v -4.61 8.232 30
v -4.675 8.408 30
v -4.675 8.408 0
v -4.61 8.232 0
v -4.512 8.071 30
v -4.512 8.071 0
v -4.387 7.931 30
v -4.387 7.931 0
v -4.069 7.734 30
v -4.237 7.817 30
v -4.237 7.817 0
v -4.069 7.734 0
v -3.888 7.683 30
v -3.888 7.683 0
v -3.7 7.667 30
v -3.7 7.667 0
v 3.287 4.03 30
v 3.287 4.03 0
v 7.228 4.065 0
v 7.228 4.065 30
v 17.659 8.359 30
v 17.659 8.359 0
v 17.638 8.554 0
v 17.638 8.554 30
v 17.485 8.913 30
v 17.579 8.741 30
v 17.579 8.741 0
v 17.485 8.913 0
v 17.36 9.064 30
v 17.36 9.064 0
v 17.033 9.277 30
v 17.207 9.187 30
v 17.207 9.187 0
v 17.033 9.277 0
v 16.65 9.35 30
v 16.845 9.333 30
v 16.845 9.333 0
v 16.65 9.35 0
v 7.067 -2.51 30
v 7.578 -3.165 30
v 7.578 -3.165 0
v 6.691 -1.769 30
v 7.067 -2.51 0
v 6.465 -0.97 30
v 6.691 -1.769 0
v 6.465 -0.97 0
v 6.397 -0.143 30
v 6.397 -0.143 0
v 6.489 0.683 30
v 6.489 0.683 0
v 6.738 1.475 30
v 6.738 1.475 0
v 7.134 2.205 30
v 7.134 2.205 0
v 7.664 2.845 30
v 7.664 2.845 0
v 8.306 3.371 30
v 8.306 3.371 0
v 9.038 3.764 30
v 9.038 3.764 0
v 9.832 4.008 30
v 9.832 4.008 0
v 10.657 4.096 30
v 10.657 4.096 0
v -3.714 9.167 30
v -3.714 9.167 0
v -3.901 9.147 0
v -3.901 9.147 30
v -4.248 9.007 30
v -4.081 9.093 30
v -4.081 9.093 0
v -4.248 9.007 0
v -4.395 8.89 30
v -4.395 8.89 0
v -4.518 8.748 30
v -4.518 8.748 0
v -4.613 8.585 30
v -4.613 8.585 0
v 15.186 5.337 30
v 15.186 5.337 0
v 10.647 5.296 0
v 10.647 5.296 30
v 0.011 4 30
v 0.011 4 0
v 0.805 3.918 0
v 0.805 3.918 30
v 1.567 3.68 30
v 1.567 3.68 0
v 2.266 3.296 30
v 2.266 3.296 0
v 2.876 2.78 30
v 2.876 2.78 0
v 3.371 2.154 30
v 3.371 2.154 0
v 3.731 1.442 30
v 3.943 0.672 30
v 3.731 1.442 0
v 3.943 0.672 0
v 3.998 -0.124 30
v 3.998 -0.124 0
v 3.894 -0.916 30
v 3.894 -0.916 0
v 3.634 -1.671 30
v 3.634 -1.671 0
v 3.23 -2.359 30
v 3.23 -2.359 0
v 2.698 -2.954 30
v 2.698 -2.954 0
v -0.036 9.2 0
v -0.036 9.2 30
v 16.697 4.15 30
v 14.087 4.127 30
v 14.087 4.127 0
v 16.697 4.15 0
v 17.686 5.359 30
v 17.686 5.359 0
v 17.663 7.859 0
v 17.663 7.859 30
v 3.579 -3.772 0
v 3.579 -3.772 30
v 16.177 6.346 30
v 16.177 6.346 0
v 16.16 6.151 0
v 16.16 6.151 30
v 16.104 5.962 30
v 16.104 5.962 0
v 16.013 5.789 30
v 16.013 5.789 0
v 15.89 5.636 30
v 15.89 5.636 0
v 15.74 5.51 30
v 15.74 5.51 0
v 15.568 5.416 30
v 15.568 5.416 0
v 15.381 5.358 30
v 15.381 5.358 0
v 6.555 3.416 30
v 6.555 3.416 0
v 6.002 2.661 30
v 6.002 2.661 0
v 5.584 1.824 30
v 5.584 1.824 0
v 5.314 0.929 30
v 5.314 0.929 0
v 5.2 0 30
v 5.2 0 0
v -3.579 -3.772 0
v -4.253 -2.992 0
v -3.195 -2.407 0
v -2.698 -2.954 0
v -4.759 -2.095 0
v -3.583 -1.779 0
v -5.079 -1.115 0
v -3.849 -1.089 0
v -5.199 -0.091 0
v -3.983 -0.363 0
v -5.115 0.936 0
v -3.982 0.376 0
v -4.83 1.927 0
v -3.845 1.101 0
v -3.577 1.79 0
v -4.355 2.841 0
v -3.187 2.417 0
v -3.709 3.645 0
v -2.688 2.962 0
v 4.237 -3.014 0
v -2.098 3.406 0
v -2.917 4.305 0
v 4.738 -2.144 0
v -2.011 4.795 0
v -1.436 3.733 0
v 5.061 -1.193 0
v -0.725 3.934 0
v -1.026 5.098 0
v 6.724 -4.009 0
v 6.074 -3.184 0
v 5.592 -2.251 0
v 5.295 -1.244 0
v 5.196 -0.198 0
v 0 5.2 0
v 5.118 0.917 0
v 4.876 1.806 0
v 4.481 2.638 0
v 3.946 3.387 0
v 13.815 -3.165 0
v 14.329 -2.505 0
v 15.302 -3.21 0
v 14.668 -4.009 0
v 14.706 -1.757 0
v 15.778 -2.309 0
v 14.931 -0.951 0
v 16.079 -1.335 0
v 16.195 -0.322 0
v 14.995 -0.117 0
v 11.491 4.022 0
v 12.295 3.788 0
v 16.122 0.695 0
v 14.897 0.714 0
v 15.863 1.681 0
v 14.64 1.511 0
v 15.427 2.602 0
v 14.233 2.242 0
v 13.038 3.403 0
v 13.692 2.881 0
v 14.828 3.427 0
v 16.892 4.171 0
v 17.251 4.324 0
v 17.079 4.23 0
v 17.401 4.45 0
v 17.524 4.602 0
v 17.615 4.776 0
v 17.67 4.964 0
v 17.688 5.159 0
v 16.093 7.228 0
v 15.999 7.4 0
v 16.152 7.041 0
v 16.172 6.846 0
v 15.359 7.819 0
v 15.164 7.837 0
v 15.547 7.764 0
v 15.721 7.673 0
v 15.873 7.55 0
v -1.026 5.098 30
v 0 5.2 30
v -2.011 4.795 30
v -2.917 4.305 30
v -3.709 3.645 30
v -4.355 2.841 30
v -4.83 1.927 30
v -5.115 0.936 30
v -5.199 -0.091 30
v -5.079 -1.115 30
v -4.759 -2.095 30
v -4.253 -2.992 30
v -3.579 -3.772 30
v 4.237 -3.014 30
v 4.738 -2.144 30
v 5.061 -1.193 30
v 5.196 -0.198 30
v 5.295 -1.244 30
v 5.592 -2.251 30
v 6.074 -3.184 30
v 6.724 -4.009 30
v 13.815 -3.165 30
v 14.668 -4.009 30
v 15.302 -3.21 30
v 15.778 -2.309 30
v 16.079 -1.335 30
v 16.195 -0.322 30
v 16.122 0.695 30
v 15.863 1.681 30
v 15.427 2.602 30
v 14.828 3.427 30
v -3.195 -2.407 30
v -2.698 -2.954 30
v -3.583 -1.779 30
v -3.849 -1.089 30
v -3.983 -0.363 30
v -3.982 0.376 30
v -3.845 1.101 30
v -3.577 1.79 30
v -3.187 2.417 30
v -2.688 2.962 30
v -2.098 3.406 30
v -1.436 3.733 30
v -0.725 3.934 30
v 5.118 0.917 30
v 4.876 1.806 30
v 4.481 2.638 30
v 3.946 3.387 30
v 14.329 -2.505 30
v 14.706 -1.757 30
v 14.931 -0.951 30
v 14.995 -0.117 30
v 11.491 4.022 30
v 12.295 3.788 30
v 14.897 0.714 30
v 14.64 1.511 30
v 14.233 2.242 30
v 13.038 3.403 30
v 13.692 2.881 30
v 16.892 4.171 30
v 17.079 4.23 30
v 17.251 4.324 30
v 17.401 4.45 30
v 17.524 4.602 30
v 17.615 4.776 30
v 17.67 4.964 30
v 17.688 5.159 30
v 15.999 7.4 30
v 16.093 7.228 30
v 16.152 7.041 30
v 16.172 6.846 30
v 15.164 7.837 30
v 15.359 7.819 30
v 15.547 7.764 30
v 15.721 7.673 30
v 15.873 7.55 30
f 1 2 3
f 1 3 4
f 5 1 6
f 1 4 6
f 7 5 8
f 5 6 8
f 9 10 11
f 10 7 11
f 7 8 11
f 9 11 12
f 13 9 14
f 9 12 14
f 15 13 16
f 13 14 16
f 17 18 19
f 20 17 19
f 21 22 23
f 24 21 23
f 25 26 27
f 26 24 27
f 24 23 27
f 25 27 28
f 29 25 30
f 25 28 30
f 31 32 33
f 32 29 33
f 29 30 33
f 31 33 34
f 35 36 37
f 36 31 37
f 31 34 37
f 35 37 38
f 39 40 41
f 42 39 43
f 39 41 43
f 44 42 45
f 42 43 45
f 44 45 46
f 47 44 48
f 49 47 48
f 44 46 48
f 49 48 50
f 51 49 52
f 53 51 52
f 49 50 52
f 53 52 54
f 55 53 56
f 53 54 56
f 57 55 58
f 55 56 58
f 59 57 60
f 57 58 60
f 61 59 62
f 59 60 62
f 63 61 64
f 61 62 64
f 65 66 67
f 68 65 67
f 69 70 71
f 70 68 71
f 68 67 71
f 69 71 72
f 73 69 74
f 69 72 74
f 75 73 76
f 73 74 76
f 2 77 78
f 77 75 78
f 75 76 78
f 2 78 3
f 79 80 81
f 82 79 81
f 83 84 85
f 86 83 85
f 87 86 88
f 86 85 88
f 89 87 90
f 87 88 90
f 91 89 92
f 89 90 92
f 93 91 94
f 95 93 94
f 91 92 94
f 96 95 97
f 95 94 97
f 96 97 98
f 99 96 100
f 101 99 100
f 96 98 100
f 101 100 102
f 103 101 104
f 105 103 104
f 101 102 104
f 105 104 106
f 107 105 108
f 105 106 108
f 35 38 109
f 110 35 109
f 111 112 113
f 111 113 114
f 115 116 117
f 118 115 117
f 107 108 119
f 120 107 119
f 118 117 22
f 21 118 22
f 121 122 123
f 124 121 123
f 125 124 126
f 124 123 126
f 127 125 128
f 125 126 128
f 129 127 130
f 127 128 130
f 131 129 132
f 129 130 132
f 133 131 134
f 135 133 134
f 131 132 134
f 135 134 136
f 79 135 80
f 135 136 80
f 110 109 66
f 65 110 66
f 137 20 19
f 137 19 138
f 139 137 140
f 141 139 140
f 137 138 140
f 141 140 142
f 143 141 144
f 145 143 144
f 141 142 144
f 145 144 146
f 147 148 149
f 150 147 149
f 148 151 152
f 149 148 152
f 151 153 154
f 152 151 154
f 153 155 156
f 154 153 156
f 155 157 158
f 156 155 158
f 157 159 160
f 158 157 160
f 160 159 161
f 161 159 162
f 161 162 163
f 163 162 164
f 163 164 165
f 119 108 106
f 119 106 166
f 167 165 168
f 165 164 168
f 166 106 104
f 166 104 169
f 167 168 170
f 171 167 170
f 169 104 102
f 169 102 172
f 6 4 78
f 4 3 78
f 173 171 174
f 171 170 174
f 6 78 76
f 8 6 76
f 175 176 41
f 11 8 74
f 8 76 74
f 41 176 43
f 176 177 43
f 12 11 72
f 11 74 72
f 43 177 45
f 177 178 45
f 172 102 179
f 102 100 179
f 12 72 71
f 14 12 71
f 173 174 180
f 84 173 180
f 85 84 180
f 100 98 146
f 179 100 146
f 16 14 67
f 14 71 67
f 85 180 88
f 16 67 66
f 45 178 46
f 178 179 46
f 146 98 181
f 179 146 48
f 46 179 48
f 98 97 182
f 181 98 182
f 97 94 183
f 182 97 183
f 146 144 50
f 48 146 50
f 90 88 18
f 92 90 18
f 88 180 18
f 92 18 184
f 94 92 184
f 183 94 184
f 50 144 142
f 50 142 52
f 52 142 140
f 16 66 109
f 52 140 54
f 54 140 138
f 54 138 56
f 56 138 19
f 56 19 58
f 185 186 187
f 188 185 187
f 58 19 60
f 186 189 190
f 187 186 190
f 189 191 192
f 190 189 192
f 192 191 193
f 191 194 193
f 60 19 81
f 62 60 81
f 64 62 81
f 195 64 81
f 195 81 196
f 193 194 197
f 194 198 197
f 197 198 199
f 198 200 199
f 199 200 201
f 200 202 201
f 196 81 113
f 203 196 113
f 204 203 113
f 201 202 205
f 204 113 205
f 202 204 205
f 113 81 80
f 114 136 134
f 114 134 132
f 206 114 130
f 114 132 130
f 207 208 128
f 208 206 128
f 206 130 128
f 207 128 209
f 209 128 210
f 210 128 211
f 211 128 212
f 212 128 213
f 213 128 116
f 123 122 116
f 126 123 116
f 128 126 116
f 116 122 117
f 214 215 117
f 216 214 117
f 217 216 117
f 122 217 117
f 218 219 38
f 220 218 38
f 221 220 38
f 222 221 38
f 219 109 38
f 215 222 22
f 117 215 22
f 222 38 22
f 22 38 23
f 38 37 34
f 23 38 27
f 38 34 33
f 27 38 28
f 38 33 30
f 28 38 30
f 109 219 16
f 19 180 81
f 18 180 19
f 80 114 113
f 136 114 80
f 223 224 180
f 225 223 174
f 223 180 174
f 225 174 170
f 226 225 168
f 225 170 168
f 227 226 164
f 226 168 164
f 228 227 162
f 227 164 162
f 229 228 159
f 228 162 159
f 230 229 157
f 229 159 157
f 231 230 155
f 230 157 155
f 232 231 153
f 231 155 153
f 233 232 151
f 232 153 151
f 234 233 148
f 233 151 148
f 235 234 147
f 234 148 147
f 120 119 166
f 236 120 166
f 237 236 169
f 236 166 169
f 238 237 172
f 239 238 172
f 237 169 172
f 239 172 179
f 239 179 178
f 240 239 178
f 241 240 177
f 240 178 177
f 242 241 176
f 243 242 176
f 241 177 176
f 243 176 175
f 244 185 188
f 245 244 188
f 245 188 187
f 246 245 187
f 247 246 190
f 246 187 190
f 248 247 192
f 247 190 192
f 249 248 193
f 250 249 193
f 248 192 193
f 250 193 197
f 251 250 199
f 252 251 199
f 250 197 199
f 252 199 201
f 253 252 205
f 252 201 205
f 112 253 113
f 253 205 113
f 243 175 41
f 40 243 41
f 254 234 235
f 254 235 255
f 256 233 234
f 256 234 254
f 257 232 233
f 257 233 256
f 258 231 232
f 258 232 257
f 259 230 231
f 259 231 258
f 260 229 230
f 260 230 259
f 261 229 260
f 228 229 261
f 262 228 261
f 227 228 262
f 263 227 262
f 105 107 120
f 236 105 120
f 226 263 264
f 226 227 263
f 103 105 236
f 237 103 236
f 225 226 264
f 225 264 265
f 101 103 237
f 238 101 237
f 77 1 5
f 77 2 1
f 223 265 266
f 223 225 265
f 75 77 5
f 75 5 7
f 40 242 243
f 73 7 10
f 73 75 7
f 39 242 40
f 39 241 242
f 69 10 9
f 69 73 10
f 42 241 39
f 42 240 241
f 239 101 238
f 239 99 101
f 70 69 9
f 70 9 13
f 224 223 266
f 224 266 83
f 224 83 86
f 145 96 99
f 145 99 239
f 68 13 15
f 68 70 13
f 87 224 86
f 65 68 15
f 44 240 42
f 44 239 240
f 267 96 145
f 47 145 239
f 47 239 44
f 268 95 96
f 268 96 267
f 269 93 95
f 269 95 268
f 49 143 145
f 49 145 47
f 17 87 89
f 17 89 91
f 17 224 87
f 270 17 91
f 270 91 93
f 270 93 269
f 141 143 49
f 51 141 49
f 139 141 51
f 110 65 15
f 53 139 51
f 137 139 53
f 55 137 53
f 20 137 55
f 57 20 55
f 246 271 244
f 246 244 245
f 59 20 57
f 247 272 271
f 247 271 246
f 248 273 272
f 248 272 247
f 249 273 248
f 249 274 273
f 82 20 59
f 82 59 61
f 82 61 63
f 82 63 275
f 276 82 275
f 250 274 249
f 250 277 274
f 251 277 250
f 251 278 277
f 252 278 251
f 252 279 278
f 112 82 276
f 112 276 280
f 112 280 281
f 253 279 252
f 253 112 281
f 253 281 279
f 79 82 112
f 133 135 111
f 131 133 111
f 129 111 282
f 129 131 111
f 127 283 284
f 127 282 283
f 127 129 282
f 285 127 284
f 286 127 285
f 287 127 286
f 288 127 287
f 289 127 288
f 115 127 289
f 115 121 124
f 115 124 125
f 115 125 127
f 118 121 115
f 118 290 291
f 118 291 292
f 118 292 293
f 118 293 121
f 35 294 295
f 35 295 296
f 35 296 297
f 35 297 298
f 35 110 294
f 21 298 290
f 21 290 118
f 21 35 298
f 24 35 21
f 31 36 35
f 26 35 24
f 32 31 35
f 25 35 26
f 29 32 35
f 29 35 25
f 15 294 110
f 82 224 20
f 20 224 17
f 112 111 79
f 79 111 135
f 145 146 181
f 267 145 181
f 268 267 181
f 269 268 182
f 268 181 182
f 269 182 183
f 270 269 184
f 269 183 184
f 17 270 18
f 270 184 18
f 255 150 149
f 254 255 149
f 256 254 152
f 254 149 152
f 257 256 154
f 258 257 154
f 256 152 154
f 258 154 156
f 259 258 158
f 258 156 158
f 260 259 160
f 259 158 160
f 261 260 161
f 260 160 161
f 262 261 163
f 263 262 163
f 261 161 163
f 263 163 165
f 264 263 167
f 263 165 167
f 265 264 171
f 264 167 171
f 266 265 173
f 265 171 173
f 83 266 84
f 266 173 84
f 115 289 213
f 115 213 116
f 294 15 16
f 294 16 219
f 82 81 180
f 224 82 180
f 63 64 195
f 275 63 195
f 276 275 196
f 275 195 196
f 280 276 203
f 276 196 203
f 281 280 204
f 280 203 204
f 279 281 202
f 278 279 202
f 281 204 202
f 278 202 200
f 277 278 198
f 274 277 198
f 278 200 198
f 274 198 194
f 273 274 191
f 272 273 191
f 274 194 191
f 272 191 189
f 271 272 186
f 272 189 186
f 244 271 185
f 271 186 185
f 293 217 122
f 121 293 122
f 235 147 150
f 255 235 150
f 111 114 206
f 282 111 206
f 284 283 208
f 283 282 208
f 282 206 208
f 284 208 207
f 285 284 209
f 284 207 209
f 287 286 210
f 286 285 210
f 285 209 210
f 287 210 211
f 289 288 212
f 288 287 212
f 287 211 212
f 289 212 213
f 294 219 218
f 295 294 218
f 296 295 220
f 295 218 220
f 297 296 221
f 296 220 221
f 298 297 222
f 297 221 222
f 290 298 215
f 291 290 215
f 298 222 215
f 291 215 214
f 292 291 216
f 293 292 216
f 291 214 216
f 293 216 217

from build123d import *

# Parameters (mm, degrees)
F1_DEPTH    = 30
F2_T1_DEPTH = 30
F2_T3_DEPTH = 35


# Not quite as in the source:
# - a fillet or chamfer that OpenCascade refuses, or shapes differently, is made with other operations: its cross-section is extruded or revolved along the edge and cut away or added
# - ends of sketch curves that miss each other by under 0.0002 mm in the source are joined


with BuildPart() as f1:
    # F0 (on Top) → F1 (new body)
    with BuildSketch(Plane.XY):
        with BuildLine():
            ThreePointArc((0.0108101467, 3.9999853926), (3.7311619501, 1.441676282), (2.6975556514, -2.9535052916))
            Line((2.6975556514, -2.9535052916), (3.5790398152, -3.7723300494))
            ThreePointArc((3.5790398152, -3.7723300494), (4.7376169007, -2.1435918693), (5.1962235425, -0.1981436252))
            ThreePointArc((5.1962235425, -0.1981436252), (5.1972192437, -0.0990548017), (5.2, 0))
            ThreePointArc((5.2, 0), (4.6973944029, 2.2303555374), (3.2867362218, 4.0295613915))
            Line((3.2867362218, 4.0295613915), (0.0108101467, 3.9999853926))
        make_face()
        with BuildLine():
            ThreePointArc((-2.6975556514, -2.9535052916), (-3.7272521414, 1.4517546193), (0.0108101467, 3.9999853926))
            Line((0.0108101467, 3.9999853926), (3.2867362218, 4.0295613915))
            ThreePointArc((3.2867362218, 4.0295613915), (1.7444599113, 4.8986589612), (0, 5.2))
            ThreePointArc((0, 5.2), (-4.8299128489, 1.9266400472), (-3.5790398152, -3.7723300494))
            Line((-3.5790398152, -3.7723300494), (-2.6975556514, -2.9535052916))
        make_face()
        with BuildLine():
            ThreePointArc((0, 5.2), (1.7444599113, 4.8986589612), (3.2867362218, 4.0295613915))
            Line((3.2867362218, 4.0295613915), (7.2283371129, 4.065071131))
            ThreePointArc((7.2283371129, 4.065071131), (8.8329374117, 4.9709020374), (10.646673336, 5.2959154939))
            Line((10.646673336, 5.2959154939), (0, 5.2))
        make_face()
        with BuildLine():
            ThreePointArc((5.2, 0), (5.1972192437, -0.0990548017), (5.1962235425, -0.1981436252))
            ThreePointArc((5.1962235425, -0.1981436252), (5.1990557999, -0.099089805), (5.2, 0))
        make_face()
        with BuildLine():
            ThreePointArc((5.2, 0), (5.1990557999, -0.099089805), (5.1962235425, -0.1981436252))
            ThreePointArc((5.1962235425, -0.1981436252), (5.5915030666, -2.2512643656), (6.7244861035, -4.0085065559))
            Line((6.7244861035, -4.0085065559), (7.5779271506, -3.1646460444))
            ThreePointArc((7.5779271506, -3.1646460444), (6.7375812297, 1.4751784497), (10.6574836162, 4.0959641875))
            Line((10.6574836162, 4.0959641875), (7.2283371129, 4.065071131))
            ThreePointArc((7.2283371129, 4.065071131), (5.7748395568, 2.2517463212), (5.2, 0))
        make_face()
        with BuildLine():
            ThreePointArc((10.646673336, 5.2959154939), (8.8329374117, 4.9709020374), (7.2283371129, 4.065071131))
            Line((7.2283371129, 4.065071131), (10.6574836162, 4.0959641875))
            Line((10.6574836162, 4.0959641875), (14.0866300839, 4.1268572436))
            ThreePointArc((14.0866300839, 4.1268572436), (12.4659704087, 5.0036318817), (10.646673336, 5.2959154939))
        make_face()
        with BuildLine():
            Line((16.1859897918, 5.345818995), (10.646673336, 5.2959154939))
            ThreePointArc((10.646673336, 5.2959154939), (12.4659704087, 5.0036318817), (14.0866300839, 4.1268572436))
            Line((14.0866300839, 4.1268572436), (17.6967392423, 4.1593805861))
            Line((17.6967392423, 4.1593805861), (17.6859289245, 5.3593318922))
            Line((17.6859289245, 5.3593318922), (16.1859897918, 5.345818995))
        make_face()
        with BuildLine():
            Line((14.0866300839, 4.1268572436), (10.6574836162, 4.0959641875))
            ThreePointArc((10.6574836162, 4.0959641875), (14.6395734892, 1.510772092), (13.8145139904, -3.1646460444))
            Line((13.8145139904, -3.1646460444), (14.6679550375, -4.0085065559))
            ThreePointArc((14.6679550375, -4.0085065559), (16.1822325131, 0.1881501089), (14.0866300839, 4.1268572436))
        make_face()
        Polygon((16.1634682964, 7.8457175493), (16.1859897918, 5.345818995), (17.6859289245, 5.3593318922), (17.6634074291, 7.8592304466), align=None)
        Polygon((-0.0225214954, 7.6998985544), (16.1634682964, 7.8457175493), (17.6634074291, 7.8592304466), (17.6498945318, 9.3591695792), (-0.0360343926, 9.199837687), (-4.7136558579, 9.1576971649), (-4.7001429606, 7.6577580323), align=None)
    extrude(amount=F1_DEPTH)

    # F2: fillet of radius 1 on 6 edges, made by hand

    # F2_s2 → F2_t1 (join)
    with BuildSketch(Plane.XY):
        with BuildLine():
            ThreePointArc((15.1635088747, 7.8367089512), (15.87322552, 7.5501976583), (16.1724768946, 6.8457581276))
            Line((16.1724768946, 6.8457581276), (16.1634682964, 7.8457175493))
            Line((16.1634682964, 7.8457175493), (15.1635088747, 7.8367089512))
        make_face()
        with BuildLine():
            ThreePointArc((16.1769811937, 6.3457784167), (15.8904699008, 5.6360617714), (15.1860303701, 5.3368103968))
            Line((15.1860303701, 5.3368103968), (16.1859897918, 5.345818995))
            Line((16.1859897918, 5.345818995), (16.1769811937, 6.3457784167))
        make_face()
    extrude(amount=F2_T1_DEPTH)

    # F2_s4 → F2_t3 (cut)
    with BuildSketch(Plane.XY.offset(-2.5)):
        with BuildLine():
            ThreePointArc((16.6967798205, 4.1503719879), (17.4012193512, 4.4496233625), (17.6877306441, 5.1593400078))
            Line((17.6877306441, 5.1593400078), (17.6967392423, 4.1593805861))
            Line((17.6967392423, 4.1593805861), (16.6967798205, 4.1503719879))
        make_face()
        with BuildLine():
            ThreePointArc((17.65890313, 8.3592101575), (17.3596517554, 9.0636496882), (16.6499351101, 9.3501609811))
            Line((16.6499351101, 9.3501609811), (17.6498945318, 9.3591695792))
            Line((17.6498945318, 9.3591695792), (17.65890313, 8.3592101575))
        make_face()
        with BuildLine():
            ThreePointArc((-3.7136964361, 9.1667057631), (-4.4181359668, 8.8674543885), (-4.7046472597, 8.1577377432))
            Line((-4.7046472597, 8.1577377432), (-4.7136558579, 9.1576971649))
            Line((-4.7136558579, 9.1576971649), (-3.7136964361, 9.1667057631))
        make_face()
        with BuildLine():
            ThreePointArc((-4.7091515588, 8.657717454), (-4.4099001842, 7.9532779233), (-3.7001835389, 7.6667666304))
            Line((-3.7001835389, 7.6667666304), (-4.7001429606, 7.6577580323))
            Line((-4.7001429606, 7.6577580323), (-4.7091515588, 8.657717454))
        make_face()
    extrude(amount=F2_T3_DEPTH, mode=Mode.SUBTRACT)


solid = f1.part
